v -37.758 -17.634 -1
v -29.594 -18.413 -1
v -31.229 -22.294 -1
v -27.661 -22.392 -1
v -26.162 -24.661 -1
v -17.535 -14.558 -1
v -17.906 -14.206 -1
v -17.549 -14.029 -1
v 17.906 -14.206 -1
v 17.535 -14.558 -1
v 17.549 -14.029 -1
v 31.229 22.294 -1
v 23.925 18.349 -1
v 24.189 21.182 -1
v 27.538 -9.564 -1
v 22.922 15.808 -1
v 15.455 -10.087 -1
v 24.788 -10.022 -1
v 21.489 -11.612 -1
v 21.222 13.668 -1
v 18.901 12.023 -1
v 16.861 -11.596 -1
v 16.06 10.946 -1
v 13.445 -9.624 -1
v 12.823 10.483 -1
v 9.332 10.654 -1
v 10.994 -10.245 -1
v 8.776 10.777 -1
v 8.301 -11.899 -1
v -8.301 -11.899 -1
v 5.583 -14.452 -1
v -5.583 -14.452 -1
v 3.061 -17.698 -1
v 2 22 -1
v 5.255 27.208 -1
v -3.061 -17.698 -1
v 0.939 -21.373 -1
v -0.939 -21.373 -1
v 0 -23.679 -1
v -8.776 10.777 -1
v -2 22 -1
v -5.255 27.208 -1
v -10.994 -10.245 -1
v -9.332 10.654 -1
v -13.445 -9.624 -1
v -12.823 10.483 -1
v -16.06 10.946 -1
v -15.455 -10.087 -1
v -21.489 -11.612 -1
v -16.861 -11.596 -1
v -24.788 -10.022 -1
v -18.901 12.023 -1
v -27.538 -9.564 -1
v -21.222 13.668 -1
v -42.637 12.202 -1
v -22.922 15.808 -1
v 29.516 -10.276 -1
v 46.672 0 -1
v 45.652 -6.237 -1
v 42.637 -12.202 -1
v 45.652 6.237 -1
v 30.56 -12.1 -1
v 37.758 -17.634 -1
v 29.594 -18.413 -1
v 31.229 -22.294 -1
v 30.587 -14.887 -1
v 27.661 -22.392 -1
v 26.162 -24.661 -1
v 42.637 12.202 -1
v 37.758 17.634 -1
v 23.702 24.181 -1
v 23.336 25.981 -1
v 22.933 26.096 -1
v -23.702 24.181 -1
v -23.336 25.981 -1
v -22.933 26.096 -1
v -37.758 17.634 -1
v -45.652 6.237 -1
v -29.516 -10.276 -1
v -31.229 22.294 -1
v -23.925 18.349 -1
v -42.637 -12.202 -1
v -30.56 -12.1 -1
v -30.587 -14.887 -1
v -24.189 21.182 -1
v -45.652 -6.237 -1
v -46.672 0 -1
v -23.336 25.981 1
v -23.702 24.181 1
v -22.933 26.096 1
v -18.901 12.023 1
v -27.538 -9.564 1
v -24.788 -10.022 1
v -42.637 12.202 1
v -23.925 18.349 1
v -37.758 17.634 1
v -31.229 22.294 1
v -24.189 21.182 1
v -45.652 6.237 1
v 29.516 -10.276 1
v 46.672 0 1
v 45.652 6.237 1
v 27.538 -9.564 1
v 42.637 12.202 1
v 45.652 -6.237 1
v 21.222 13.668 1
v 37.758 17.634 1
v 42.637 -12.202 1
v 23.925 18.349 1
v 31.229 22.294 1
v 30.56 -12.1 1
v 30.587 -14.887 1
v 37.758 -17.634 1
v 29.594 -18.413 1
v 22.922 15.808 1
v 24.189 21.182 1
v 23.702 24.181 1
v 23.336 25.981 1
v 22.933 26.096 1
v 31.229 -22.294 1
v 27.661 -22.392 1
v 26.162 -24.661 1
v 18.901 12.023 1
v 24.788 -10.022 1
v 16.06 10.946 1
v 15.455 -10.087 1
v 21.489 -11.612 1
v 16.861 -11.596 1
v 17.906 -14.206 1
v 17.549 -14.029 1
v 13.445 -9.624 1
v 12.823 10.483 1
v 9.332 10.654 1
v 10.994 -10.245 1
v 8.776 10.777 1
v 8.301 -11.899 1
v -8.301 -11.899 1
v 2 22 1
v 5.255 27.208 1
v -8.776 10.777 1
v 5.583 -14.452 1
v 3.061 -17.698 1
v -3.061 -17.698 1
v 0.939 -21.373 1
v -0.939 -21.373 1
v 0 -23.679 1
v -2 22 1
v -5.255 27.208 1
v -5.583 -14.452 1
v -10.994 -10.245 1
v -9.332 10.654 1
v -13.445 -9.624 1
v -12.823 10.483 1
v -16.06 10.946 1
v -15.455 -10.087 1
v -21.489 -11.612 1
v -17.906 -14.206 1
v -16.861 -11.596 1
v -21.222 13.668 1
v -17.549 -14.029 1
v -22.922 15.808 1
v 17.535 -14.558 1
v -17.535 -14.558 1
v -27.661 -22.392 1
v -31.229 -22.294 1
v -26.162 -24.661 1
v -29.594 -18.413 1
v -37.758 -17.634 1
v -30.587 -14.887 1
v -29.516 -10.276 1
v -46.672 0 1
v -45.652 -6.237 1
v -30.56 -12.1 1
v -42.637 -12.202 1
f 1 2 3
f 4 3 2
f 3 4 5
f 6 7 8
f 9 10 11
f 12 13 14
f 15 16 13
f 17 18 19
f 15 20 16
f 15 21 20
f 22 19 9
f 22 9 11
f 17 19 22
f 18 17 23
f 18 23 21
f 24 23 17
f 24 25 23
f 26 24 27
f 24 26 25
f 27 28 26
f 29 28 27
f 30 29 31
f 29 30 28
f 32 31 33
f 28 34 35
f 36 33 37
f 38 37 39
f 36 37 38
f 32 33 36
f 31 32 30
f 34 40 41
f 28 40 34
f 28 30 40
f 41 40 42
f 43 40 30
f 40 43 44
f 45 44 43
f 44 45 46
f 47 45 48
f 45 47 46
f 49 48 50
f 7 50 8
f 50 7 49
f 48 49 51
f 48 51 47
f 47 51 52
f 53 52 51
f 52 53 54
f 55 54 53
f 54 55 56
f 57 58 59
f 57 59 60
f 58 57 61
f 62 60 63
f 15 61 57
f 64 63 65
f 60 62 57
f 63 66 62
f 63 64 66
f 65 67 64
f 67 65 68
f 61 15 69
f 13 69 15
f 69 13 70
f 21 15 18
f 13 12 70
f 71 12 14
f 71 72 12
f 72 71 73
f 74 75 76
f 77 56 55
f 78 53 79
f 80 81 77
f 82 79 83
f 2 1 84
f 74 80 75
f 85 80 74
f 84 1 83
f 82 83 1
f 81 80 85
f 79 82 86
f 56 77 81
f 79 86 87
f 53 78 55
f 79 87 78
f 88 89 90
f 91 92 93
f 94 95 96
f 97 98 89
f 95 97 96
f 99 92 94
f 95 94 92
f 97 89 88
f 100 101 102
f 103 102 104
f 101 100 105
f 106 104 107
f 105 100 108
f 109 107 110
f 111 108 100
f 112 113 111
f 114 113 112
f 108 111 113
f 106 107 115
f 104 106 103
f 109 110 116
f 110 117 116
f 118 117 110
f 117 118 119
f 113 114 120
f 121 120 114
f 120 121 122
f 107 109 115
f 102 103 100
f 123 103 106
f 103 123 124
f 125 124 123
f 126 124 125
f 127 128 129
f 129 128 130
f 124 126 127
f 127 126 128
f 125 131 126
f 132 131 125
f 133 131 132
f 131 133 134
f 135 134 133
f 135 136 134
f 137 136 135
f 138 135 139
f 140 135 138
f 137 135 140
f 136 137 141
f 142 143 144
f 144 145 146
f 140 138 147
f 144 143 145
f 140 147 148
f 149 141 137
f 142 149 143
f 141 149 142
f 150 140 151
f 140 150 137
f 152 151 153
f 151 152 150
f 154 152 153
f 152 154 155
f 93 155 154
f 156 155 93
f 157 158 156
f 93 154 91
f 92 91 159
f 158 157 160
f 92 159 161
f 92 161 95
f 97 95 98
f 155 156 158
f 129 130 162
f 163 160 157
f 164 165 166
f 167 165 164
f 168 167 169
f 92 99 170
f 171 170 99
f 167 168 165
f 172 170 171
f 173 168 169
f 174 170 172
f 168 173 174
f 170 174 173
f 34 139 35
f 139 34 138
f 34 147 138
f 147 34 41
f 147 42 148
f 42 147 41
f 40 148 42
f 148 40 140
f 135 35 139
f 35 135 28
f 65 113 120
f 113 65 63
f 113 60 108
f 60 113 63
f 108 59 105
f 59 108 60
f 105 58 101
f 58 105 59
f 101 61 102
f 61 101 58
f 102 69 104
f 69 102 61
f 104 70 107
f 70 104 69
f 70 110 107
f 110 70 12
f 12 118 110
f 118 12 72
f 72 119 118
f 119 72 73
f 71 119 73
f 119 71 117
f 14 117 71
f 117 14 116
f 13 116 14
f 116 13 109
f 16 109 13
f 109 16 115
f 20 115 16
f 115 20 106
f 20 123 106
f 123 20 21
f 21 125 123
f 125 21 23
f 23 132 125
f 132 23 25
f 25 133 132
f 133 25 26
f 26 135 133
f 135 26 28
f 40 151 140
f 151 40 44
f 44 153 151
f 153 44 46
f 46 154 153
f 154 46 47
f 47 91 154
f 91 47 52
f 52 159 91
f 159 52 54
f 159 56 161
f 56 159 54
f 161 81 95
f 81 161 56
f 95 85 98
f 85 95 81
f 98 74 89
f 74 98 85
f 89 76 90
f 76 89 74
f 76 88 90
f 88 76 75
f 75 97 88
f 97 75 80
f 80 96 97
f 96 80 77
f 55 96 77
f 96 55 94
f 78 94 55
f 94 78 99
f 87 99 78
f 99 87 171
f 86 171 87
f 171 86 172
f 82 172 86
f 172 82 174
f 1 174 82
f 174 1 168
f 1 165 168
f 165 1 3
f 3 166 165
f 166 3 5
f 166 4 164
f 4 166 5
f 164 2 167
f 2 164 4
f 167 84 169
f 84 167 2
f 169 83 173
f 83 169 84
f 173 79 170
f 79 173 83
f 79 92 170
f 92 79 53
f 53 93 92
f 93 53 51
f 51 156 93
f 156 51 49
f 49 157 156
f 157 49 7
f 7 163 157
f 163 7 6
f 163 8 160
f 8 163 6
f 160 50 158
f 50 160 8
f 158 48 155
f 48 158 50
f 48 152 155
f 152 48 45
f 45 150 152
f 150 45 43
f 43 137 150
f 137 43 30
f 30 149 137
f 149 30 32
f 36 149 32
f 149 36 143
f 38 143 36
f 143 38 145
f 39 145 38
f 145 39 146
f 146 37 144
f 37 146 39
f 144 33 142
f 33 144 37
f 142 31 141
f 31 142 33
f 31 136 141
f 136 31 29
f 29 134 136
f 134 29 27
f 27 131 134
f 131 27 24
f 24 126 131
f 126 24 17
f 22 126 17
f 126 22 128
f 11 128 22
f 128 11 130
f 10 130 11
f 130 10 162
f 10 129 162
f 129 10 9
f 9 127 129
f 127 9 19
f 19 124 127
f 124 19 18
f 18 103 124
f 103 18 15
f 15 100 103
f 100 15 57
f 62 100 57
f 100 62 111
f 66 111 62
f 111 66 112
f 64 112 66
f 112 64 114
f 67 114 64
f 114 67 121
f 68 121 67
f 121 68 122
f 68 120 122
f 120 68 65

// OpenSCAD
color([0.15,0.15,0.15])
linear_extrude(height = 2, center = true, convexity = 10, twist = 0)
difference(){

translate([0,20,0])
polygon(points=[[-9.8, -14], [9.8,-14],[3.8, 14],[-3.8, 14] ],paths=[[0,1,2,3]], convexity=10);

translate([0,30,0])
polygon(points=[[-2, -8], [2,-8],[12, 8],[-12, 8] ],paths=[[0,1,2,3]], convexity=10);
}

color([0.15,0.15,0.15])
linear_extrude(height = 2, center = true, convexity = 10, twist = 0)
difference(){

projection(cut=true) 
rotate([0,50,0])
cylinder(r=30, h=200, center=true);

translate([-8,-23,0]) 
rotate([0,0,-60])
projection(cut=true)
rotate([0,62,0])
cylinder(r=7, h=200, center=true);

translate([8,-23,0]) 
rotate([0,0,60])
projection(cut=true)
rotate([0,62,0])
cylinder(r=7, h=200, center=true);

translate([-18,-24,0]) 
rotate([0,0,-50])
projection(cut=true)
rotate([0,67,0])
cylinder(r=7, h=200, center=true);

translate([18,-24,0]) 
rotate([0,0,50])
projection(cut=true)
rotate([0,67,0])
cylinder(r=7, h=200, center=true);

union(){

translate([-7,25,0]) 
rotate([0,0,30])
projection(cut=true)
rotate([0,45,0])
cylinder(r=13, h=200, center=true);

translate([7,25,0]) 
rotate([0,0,-30])
projection(cut=true)
rotate([0,45,0])
cylinder(r=13, h=200, center=true);
}

}
